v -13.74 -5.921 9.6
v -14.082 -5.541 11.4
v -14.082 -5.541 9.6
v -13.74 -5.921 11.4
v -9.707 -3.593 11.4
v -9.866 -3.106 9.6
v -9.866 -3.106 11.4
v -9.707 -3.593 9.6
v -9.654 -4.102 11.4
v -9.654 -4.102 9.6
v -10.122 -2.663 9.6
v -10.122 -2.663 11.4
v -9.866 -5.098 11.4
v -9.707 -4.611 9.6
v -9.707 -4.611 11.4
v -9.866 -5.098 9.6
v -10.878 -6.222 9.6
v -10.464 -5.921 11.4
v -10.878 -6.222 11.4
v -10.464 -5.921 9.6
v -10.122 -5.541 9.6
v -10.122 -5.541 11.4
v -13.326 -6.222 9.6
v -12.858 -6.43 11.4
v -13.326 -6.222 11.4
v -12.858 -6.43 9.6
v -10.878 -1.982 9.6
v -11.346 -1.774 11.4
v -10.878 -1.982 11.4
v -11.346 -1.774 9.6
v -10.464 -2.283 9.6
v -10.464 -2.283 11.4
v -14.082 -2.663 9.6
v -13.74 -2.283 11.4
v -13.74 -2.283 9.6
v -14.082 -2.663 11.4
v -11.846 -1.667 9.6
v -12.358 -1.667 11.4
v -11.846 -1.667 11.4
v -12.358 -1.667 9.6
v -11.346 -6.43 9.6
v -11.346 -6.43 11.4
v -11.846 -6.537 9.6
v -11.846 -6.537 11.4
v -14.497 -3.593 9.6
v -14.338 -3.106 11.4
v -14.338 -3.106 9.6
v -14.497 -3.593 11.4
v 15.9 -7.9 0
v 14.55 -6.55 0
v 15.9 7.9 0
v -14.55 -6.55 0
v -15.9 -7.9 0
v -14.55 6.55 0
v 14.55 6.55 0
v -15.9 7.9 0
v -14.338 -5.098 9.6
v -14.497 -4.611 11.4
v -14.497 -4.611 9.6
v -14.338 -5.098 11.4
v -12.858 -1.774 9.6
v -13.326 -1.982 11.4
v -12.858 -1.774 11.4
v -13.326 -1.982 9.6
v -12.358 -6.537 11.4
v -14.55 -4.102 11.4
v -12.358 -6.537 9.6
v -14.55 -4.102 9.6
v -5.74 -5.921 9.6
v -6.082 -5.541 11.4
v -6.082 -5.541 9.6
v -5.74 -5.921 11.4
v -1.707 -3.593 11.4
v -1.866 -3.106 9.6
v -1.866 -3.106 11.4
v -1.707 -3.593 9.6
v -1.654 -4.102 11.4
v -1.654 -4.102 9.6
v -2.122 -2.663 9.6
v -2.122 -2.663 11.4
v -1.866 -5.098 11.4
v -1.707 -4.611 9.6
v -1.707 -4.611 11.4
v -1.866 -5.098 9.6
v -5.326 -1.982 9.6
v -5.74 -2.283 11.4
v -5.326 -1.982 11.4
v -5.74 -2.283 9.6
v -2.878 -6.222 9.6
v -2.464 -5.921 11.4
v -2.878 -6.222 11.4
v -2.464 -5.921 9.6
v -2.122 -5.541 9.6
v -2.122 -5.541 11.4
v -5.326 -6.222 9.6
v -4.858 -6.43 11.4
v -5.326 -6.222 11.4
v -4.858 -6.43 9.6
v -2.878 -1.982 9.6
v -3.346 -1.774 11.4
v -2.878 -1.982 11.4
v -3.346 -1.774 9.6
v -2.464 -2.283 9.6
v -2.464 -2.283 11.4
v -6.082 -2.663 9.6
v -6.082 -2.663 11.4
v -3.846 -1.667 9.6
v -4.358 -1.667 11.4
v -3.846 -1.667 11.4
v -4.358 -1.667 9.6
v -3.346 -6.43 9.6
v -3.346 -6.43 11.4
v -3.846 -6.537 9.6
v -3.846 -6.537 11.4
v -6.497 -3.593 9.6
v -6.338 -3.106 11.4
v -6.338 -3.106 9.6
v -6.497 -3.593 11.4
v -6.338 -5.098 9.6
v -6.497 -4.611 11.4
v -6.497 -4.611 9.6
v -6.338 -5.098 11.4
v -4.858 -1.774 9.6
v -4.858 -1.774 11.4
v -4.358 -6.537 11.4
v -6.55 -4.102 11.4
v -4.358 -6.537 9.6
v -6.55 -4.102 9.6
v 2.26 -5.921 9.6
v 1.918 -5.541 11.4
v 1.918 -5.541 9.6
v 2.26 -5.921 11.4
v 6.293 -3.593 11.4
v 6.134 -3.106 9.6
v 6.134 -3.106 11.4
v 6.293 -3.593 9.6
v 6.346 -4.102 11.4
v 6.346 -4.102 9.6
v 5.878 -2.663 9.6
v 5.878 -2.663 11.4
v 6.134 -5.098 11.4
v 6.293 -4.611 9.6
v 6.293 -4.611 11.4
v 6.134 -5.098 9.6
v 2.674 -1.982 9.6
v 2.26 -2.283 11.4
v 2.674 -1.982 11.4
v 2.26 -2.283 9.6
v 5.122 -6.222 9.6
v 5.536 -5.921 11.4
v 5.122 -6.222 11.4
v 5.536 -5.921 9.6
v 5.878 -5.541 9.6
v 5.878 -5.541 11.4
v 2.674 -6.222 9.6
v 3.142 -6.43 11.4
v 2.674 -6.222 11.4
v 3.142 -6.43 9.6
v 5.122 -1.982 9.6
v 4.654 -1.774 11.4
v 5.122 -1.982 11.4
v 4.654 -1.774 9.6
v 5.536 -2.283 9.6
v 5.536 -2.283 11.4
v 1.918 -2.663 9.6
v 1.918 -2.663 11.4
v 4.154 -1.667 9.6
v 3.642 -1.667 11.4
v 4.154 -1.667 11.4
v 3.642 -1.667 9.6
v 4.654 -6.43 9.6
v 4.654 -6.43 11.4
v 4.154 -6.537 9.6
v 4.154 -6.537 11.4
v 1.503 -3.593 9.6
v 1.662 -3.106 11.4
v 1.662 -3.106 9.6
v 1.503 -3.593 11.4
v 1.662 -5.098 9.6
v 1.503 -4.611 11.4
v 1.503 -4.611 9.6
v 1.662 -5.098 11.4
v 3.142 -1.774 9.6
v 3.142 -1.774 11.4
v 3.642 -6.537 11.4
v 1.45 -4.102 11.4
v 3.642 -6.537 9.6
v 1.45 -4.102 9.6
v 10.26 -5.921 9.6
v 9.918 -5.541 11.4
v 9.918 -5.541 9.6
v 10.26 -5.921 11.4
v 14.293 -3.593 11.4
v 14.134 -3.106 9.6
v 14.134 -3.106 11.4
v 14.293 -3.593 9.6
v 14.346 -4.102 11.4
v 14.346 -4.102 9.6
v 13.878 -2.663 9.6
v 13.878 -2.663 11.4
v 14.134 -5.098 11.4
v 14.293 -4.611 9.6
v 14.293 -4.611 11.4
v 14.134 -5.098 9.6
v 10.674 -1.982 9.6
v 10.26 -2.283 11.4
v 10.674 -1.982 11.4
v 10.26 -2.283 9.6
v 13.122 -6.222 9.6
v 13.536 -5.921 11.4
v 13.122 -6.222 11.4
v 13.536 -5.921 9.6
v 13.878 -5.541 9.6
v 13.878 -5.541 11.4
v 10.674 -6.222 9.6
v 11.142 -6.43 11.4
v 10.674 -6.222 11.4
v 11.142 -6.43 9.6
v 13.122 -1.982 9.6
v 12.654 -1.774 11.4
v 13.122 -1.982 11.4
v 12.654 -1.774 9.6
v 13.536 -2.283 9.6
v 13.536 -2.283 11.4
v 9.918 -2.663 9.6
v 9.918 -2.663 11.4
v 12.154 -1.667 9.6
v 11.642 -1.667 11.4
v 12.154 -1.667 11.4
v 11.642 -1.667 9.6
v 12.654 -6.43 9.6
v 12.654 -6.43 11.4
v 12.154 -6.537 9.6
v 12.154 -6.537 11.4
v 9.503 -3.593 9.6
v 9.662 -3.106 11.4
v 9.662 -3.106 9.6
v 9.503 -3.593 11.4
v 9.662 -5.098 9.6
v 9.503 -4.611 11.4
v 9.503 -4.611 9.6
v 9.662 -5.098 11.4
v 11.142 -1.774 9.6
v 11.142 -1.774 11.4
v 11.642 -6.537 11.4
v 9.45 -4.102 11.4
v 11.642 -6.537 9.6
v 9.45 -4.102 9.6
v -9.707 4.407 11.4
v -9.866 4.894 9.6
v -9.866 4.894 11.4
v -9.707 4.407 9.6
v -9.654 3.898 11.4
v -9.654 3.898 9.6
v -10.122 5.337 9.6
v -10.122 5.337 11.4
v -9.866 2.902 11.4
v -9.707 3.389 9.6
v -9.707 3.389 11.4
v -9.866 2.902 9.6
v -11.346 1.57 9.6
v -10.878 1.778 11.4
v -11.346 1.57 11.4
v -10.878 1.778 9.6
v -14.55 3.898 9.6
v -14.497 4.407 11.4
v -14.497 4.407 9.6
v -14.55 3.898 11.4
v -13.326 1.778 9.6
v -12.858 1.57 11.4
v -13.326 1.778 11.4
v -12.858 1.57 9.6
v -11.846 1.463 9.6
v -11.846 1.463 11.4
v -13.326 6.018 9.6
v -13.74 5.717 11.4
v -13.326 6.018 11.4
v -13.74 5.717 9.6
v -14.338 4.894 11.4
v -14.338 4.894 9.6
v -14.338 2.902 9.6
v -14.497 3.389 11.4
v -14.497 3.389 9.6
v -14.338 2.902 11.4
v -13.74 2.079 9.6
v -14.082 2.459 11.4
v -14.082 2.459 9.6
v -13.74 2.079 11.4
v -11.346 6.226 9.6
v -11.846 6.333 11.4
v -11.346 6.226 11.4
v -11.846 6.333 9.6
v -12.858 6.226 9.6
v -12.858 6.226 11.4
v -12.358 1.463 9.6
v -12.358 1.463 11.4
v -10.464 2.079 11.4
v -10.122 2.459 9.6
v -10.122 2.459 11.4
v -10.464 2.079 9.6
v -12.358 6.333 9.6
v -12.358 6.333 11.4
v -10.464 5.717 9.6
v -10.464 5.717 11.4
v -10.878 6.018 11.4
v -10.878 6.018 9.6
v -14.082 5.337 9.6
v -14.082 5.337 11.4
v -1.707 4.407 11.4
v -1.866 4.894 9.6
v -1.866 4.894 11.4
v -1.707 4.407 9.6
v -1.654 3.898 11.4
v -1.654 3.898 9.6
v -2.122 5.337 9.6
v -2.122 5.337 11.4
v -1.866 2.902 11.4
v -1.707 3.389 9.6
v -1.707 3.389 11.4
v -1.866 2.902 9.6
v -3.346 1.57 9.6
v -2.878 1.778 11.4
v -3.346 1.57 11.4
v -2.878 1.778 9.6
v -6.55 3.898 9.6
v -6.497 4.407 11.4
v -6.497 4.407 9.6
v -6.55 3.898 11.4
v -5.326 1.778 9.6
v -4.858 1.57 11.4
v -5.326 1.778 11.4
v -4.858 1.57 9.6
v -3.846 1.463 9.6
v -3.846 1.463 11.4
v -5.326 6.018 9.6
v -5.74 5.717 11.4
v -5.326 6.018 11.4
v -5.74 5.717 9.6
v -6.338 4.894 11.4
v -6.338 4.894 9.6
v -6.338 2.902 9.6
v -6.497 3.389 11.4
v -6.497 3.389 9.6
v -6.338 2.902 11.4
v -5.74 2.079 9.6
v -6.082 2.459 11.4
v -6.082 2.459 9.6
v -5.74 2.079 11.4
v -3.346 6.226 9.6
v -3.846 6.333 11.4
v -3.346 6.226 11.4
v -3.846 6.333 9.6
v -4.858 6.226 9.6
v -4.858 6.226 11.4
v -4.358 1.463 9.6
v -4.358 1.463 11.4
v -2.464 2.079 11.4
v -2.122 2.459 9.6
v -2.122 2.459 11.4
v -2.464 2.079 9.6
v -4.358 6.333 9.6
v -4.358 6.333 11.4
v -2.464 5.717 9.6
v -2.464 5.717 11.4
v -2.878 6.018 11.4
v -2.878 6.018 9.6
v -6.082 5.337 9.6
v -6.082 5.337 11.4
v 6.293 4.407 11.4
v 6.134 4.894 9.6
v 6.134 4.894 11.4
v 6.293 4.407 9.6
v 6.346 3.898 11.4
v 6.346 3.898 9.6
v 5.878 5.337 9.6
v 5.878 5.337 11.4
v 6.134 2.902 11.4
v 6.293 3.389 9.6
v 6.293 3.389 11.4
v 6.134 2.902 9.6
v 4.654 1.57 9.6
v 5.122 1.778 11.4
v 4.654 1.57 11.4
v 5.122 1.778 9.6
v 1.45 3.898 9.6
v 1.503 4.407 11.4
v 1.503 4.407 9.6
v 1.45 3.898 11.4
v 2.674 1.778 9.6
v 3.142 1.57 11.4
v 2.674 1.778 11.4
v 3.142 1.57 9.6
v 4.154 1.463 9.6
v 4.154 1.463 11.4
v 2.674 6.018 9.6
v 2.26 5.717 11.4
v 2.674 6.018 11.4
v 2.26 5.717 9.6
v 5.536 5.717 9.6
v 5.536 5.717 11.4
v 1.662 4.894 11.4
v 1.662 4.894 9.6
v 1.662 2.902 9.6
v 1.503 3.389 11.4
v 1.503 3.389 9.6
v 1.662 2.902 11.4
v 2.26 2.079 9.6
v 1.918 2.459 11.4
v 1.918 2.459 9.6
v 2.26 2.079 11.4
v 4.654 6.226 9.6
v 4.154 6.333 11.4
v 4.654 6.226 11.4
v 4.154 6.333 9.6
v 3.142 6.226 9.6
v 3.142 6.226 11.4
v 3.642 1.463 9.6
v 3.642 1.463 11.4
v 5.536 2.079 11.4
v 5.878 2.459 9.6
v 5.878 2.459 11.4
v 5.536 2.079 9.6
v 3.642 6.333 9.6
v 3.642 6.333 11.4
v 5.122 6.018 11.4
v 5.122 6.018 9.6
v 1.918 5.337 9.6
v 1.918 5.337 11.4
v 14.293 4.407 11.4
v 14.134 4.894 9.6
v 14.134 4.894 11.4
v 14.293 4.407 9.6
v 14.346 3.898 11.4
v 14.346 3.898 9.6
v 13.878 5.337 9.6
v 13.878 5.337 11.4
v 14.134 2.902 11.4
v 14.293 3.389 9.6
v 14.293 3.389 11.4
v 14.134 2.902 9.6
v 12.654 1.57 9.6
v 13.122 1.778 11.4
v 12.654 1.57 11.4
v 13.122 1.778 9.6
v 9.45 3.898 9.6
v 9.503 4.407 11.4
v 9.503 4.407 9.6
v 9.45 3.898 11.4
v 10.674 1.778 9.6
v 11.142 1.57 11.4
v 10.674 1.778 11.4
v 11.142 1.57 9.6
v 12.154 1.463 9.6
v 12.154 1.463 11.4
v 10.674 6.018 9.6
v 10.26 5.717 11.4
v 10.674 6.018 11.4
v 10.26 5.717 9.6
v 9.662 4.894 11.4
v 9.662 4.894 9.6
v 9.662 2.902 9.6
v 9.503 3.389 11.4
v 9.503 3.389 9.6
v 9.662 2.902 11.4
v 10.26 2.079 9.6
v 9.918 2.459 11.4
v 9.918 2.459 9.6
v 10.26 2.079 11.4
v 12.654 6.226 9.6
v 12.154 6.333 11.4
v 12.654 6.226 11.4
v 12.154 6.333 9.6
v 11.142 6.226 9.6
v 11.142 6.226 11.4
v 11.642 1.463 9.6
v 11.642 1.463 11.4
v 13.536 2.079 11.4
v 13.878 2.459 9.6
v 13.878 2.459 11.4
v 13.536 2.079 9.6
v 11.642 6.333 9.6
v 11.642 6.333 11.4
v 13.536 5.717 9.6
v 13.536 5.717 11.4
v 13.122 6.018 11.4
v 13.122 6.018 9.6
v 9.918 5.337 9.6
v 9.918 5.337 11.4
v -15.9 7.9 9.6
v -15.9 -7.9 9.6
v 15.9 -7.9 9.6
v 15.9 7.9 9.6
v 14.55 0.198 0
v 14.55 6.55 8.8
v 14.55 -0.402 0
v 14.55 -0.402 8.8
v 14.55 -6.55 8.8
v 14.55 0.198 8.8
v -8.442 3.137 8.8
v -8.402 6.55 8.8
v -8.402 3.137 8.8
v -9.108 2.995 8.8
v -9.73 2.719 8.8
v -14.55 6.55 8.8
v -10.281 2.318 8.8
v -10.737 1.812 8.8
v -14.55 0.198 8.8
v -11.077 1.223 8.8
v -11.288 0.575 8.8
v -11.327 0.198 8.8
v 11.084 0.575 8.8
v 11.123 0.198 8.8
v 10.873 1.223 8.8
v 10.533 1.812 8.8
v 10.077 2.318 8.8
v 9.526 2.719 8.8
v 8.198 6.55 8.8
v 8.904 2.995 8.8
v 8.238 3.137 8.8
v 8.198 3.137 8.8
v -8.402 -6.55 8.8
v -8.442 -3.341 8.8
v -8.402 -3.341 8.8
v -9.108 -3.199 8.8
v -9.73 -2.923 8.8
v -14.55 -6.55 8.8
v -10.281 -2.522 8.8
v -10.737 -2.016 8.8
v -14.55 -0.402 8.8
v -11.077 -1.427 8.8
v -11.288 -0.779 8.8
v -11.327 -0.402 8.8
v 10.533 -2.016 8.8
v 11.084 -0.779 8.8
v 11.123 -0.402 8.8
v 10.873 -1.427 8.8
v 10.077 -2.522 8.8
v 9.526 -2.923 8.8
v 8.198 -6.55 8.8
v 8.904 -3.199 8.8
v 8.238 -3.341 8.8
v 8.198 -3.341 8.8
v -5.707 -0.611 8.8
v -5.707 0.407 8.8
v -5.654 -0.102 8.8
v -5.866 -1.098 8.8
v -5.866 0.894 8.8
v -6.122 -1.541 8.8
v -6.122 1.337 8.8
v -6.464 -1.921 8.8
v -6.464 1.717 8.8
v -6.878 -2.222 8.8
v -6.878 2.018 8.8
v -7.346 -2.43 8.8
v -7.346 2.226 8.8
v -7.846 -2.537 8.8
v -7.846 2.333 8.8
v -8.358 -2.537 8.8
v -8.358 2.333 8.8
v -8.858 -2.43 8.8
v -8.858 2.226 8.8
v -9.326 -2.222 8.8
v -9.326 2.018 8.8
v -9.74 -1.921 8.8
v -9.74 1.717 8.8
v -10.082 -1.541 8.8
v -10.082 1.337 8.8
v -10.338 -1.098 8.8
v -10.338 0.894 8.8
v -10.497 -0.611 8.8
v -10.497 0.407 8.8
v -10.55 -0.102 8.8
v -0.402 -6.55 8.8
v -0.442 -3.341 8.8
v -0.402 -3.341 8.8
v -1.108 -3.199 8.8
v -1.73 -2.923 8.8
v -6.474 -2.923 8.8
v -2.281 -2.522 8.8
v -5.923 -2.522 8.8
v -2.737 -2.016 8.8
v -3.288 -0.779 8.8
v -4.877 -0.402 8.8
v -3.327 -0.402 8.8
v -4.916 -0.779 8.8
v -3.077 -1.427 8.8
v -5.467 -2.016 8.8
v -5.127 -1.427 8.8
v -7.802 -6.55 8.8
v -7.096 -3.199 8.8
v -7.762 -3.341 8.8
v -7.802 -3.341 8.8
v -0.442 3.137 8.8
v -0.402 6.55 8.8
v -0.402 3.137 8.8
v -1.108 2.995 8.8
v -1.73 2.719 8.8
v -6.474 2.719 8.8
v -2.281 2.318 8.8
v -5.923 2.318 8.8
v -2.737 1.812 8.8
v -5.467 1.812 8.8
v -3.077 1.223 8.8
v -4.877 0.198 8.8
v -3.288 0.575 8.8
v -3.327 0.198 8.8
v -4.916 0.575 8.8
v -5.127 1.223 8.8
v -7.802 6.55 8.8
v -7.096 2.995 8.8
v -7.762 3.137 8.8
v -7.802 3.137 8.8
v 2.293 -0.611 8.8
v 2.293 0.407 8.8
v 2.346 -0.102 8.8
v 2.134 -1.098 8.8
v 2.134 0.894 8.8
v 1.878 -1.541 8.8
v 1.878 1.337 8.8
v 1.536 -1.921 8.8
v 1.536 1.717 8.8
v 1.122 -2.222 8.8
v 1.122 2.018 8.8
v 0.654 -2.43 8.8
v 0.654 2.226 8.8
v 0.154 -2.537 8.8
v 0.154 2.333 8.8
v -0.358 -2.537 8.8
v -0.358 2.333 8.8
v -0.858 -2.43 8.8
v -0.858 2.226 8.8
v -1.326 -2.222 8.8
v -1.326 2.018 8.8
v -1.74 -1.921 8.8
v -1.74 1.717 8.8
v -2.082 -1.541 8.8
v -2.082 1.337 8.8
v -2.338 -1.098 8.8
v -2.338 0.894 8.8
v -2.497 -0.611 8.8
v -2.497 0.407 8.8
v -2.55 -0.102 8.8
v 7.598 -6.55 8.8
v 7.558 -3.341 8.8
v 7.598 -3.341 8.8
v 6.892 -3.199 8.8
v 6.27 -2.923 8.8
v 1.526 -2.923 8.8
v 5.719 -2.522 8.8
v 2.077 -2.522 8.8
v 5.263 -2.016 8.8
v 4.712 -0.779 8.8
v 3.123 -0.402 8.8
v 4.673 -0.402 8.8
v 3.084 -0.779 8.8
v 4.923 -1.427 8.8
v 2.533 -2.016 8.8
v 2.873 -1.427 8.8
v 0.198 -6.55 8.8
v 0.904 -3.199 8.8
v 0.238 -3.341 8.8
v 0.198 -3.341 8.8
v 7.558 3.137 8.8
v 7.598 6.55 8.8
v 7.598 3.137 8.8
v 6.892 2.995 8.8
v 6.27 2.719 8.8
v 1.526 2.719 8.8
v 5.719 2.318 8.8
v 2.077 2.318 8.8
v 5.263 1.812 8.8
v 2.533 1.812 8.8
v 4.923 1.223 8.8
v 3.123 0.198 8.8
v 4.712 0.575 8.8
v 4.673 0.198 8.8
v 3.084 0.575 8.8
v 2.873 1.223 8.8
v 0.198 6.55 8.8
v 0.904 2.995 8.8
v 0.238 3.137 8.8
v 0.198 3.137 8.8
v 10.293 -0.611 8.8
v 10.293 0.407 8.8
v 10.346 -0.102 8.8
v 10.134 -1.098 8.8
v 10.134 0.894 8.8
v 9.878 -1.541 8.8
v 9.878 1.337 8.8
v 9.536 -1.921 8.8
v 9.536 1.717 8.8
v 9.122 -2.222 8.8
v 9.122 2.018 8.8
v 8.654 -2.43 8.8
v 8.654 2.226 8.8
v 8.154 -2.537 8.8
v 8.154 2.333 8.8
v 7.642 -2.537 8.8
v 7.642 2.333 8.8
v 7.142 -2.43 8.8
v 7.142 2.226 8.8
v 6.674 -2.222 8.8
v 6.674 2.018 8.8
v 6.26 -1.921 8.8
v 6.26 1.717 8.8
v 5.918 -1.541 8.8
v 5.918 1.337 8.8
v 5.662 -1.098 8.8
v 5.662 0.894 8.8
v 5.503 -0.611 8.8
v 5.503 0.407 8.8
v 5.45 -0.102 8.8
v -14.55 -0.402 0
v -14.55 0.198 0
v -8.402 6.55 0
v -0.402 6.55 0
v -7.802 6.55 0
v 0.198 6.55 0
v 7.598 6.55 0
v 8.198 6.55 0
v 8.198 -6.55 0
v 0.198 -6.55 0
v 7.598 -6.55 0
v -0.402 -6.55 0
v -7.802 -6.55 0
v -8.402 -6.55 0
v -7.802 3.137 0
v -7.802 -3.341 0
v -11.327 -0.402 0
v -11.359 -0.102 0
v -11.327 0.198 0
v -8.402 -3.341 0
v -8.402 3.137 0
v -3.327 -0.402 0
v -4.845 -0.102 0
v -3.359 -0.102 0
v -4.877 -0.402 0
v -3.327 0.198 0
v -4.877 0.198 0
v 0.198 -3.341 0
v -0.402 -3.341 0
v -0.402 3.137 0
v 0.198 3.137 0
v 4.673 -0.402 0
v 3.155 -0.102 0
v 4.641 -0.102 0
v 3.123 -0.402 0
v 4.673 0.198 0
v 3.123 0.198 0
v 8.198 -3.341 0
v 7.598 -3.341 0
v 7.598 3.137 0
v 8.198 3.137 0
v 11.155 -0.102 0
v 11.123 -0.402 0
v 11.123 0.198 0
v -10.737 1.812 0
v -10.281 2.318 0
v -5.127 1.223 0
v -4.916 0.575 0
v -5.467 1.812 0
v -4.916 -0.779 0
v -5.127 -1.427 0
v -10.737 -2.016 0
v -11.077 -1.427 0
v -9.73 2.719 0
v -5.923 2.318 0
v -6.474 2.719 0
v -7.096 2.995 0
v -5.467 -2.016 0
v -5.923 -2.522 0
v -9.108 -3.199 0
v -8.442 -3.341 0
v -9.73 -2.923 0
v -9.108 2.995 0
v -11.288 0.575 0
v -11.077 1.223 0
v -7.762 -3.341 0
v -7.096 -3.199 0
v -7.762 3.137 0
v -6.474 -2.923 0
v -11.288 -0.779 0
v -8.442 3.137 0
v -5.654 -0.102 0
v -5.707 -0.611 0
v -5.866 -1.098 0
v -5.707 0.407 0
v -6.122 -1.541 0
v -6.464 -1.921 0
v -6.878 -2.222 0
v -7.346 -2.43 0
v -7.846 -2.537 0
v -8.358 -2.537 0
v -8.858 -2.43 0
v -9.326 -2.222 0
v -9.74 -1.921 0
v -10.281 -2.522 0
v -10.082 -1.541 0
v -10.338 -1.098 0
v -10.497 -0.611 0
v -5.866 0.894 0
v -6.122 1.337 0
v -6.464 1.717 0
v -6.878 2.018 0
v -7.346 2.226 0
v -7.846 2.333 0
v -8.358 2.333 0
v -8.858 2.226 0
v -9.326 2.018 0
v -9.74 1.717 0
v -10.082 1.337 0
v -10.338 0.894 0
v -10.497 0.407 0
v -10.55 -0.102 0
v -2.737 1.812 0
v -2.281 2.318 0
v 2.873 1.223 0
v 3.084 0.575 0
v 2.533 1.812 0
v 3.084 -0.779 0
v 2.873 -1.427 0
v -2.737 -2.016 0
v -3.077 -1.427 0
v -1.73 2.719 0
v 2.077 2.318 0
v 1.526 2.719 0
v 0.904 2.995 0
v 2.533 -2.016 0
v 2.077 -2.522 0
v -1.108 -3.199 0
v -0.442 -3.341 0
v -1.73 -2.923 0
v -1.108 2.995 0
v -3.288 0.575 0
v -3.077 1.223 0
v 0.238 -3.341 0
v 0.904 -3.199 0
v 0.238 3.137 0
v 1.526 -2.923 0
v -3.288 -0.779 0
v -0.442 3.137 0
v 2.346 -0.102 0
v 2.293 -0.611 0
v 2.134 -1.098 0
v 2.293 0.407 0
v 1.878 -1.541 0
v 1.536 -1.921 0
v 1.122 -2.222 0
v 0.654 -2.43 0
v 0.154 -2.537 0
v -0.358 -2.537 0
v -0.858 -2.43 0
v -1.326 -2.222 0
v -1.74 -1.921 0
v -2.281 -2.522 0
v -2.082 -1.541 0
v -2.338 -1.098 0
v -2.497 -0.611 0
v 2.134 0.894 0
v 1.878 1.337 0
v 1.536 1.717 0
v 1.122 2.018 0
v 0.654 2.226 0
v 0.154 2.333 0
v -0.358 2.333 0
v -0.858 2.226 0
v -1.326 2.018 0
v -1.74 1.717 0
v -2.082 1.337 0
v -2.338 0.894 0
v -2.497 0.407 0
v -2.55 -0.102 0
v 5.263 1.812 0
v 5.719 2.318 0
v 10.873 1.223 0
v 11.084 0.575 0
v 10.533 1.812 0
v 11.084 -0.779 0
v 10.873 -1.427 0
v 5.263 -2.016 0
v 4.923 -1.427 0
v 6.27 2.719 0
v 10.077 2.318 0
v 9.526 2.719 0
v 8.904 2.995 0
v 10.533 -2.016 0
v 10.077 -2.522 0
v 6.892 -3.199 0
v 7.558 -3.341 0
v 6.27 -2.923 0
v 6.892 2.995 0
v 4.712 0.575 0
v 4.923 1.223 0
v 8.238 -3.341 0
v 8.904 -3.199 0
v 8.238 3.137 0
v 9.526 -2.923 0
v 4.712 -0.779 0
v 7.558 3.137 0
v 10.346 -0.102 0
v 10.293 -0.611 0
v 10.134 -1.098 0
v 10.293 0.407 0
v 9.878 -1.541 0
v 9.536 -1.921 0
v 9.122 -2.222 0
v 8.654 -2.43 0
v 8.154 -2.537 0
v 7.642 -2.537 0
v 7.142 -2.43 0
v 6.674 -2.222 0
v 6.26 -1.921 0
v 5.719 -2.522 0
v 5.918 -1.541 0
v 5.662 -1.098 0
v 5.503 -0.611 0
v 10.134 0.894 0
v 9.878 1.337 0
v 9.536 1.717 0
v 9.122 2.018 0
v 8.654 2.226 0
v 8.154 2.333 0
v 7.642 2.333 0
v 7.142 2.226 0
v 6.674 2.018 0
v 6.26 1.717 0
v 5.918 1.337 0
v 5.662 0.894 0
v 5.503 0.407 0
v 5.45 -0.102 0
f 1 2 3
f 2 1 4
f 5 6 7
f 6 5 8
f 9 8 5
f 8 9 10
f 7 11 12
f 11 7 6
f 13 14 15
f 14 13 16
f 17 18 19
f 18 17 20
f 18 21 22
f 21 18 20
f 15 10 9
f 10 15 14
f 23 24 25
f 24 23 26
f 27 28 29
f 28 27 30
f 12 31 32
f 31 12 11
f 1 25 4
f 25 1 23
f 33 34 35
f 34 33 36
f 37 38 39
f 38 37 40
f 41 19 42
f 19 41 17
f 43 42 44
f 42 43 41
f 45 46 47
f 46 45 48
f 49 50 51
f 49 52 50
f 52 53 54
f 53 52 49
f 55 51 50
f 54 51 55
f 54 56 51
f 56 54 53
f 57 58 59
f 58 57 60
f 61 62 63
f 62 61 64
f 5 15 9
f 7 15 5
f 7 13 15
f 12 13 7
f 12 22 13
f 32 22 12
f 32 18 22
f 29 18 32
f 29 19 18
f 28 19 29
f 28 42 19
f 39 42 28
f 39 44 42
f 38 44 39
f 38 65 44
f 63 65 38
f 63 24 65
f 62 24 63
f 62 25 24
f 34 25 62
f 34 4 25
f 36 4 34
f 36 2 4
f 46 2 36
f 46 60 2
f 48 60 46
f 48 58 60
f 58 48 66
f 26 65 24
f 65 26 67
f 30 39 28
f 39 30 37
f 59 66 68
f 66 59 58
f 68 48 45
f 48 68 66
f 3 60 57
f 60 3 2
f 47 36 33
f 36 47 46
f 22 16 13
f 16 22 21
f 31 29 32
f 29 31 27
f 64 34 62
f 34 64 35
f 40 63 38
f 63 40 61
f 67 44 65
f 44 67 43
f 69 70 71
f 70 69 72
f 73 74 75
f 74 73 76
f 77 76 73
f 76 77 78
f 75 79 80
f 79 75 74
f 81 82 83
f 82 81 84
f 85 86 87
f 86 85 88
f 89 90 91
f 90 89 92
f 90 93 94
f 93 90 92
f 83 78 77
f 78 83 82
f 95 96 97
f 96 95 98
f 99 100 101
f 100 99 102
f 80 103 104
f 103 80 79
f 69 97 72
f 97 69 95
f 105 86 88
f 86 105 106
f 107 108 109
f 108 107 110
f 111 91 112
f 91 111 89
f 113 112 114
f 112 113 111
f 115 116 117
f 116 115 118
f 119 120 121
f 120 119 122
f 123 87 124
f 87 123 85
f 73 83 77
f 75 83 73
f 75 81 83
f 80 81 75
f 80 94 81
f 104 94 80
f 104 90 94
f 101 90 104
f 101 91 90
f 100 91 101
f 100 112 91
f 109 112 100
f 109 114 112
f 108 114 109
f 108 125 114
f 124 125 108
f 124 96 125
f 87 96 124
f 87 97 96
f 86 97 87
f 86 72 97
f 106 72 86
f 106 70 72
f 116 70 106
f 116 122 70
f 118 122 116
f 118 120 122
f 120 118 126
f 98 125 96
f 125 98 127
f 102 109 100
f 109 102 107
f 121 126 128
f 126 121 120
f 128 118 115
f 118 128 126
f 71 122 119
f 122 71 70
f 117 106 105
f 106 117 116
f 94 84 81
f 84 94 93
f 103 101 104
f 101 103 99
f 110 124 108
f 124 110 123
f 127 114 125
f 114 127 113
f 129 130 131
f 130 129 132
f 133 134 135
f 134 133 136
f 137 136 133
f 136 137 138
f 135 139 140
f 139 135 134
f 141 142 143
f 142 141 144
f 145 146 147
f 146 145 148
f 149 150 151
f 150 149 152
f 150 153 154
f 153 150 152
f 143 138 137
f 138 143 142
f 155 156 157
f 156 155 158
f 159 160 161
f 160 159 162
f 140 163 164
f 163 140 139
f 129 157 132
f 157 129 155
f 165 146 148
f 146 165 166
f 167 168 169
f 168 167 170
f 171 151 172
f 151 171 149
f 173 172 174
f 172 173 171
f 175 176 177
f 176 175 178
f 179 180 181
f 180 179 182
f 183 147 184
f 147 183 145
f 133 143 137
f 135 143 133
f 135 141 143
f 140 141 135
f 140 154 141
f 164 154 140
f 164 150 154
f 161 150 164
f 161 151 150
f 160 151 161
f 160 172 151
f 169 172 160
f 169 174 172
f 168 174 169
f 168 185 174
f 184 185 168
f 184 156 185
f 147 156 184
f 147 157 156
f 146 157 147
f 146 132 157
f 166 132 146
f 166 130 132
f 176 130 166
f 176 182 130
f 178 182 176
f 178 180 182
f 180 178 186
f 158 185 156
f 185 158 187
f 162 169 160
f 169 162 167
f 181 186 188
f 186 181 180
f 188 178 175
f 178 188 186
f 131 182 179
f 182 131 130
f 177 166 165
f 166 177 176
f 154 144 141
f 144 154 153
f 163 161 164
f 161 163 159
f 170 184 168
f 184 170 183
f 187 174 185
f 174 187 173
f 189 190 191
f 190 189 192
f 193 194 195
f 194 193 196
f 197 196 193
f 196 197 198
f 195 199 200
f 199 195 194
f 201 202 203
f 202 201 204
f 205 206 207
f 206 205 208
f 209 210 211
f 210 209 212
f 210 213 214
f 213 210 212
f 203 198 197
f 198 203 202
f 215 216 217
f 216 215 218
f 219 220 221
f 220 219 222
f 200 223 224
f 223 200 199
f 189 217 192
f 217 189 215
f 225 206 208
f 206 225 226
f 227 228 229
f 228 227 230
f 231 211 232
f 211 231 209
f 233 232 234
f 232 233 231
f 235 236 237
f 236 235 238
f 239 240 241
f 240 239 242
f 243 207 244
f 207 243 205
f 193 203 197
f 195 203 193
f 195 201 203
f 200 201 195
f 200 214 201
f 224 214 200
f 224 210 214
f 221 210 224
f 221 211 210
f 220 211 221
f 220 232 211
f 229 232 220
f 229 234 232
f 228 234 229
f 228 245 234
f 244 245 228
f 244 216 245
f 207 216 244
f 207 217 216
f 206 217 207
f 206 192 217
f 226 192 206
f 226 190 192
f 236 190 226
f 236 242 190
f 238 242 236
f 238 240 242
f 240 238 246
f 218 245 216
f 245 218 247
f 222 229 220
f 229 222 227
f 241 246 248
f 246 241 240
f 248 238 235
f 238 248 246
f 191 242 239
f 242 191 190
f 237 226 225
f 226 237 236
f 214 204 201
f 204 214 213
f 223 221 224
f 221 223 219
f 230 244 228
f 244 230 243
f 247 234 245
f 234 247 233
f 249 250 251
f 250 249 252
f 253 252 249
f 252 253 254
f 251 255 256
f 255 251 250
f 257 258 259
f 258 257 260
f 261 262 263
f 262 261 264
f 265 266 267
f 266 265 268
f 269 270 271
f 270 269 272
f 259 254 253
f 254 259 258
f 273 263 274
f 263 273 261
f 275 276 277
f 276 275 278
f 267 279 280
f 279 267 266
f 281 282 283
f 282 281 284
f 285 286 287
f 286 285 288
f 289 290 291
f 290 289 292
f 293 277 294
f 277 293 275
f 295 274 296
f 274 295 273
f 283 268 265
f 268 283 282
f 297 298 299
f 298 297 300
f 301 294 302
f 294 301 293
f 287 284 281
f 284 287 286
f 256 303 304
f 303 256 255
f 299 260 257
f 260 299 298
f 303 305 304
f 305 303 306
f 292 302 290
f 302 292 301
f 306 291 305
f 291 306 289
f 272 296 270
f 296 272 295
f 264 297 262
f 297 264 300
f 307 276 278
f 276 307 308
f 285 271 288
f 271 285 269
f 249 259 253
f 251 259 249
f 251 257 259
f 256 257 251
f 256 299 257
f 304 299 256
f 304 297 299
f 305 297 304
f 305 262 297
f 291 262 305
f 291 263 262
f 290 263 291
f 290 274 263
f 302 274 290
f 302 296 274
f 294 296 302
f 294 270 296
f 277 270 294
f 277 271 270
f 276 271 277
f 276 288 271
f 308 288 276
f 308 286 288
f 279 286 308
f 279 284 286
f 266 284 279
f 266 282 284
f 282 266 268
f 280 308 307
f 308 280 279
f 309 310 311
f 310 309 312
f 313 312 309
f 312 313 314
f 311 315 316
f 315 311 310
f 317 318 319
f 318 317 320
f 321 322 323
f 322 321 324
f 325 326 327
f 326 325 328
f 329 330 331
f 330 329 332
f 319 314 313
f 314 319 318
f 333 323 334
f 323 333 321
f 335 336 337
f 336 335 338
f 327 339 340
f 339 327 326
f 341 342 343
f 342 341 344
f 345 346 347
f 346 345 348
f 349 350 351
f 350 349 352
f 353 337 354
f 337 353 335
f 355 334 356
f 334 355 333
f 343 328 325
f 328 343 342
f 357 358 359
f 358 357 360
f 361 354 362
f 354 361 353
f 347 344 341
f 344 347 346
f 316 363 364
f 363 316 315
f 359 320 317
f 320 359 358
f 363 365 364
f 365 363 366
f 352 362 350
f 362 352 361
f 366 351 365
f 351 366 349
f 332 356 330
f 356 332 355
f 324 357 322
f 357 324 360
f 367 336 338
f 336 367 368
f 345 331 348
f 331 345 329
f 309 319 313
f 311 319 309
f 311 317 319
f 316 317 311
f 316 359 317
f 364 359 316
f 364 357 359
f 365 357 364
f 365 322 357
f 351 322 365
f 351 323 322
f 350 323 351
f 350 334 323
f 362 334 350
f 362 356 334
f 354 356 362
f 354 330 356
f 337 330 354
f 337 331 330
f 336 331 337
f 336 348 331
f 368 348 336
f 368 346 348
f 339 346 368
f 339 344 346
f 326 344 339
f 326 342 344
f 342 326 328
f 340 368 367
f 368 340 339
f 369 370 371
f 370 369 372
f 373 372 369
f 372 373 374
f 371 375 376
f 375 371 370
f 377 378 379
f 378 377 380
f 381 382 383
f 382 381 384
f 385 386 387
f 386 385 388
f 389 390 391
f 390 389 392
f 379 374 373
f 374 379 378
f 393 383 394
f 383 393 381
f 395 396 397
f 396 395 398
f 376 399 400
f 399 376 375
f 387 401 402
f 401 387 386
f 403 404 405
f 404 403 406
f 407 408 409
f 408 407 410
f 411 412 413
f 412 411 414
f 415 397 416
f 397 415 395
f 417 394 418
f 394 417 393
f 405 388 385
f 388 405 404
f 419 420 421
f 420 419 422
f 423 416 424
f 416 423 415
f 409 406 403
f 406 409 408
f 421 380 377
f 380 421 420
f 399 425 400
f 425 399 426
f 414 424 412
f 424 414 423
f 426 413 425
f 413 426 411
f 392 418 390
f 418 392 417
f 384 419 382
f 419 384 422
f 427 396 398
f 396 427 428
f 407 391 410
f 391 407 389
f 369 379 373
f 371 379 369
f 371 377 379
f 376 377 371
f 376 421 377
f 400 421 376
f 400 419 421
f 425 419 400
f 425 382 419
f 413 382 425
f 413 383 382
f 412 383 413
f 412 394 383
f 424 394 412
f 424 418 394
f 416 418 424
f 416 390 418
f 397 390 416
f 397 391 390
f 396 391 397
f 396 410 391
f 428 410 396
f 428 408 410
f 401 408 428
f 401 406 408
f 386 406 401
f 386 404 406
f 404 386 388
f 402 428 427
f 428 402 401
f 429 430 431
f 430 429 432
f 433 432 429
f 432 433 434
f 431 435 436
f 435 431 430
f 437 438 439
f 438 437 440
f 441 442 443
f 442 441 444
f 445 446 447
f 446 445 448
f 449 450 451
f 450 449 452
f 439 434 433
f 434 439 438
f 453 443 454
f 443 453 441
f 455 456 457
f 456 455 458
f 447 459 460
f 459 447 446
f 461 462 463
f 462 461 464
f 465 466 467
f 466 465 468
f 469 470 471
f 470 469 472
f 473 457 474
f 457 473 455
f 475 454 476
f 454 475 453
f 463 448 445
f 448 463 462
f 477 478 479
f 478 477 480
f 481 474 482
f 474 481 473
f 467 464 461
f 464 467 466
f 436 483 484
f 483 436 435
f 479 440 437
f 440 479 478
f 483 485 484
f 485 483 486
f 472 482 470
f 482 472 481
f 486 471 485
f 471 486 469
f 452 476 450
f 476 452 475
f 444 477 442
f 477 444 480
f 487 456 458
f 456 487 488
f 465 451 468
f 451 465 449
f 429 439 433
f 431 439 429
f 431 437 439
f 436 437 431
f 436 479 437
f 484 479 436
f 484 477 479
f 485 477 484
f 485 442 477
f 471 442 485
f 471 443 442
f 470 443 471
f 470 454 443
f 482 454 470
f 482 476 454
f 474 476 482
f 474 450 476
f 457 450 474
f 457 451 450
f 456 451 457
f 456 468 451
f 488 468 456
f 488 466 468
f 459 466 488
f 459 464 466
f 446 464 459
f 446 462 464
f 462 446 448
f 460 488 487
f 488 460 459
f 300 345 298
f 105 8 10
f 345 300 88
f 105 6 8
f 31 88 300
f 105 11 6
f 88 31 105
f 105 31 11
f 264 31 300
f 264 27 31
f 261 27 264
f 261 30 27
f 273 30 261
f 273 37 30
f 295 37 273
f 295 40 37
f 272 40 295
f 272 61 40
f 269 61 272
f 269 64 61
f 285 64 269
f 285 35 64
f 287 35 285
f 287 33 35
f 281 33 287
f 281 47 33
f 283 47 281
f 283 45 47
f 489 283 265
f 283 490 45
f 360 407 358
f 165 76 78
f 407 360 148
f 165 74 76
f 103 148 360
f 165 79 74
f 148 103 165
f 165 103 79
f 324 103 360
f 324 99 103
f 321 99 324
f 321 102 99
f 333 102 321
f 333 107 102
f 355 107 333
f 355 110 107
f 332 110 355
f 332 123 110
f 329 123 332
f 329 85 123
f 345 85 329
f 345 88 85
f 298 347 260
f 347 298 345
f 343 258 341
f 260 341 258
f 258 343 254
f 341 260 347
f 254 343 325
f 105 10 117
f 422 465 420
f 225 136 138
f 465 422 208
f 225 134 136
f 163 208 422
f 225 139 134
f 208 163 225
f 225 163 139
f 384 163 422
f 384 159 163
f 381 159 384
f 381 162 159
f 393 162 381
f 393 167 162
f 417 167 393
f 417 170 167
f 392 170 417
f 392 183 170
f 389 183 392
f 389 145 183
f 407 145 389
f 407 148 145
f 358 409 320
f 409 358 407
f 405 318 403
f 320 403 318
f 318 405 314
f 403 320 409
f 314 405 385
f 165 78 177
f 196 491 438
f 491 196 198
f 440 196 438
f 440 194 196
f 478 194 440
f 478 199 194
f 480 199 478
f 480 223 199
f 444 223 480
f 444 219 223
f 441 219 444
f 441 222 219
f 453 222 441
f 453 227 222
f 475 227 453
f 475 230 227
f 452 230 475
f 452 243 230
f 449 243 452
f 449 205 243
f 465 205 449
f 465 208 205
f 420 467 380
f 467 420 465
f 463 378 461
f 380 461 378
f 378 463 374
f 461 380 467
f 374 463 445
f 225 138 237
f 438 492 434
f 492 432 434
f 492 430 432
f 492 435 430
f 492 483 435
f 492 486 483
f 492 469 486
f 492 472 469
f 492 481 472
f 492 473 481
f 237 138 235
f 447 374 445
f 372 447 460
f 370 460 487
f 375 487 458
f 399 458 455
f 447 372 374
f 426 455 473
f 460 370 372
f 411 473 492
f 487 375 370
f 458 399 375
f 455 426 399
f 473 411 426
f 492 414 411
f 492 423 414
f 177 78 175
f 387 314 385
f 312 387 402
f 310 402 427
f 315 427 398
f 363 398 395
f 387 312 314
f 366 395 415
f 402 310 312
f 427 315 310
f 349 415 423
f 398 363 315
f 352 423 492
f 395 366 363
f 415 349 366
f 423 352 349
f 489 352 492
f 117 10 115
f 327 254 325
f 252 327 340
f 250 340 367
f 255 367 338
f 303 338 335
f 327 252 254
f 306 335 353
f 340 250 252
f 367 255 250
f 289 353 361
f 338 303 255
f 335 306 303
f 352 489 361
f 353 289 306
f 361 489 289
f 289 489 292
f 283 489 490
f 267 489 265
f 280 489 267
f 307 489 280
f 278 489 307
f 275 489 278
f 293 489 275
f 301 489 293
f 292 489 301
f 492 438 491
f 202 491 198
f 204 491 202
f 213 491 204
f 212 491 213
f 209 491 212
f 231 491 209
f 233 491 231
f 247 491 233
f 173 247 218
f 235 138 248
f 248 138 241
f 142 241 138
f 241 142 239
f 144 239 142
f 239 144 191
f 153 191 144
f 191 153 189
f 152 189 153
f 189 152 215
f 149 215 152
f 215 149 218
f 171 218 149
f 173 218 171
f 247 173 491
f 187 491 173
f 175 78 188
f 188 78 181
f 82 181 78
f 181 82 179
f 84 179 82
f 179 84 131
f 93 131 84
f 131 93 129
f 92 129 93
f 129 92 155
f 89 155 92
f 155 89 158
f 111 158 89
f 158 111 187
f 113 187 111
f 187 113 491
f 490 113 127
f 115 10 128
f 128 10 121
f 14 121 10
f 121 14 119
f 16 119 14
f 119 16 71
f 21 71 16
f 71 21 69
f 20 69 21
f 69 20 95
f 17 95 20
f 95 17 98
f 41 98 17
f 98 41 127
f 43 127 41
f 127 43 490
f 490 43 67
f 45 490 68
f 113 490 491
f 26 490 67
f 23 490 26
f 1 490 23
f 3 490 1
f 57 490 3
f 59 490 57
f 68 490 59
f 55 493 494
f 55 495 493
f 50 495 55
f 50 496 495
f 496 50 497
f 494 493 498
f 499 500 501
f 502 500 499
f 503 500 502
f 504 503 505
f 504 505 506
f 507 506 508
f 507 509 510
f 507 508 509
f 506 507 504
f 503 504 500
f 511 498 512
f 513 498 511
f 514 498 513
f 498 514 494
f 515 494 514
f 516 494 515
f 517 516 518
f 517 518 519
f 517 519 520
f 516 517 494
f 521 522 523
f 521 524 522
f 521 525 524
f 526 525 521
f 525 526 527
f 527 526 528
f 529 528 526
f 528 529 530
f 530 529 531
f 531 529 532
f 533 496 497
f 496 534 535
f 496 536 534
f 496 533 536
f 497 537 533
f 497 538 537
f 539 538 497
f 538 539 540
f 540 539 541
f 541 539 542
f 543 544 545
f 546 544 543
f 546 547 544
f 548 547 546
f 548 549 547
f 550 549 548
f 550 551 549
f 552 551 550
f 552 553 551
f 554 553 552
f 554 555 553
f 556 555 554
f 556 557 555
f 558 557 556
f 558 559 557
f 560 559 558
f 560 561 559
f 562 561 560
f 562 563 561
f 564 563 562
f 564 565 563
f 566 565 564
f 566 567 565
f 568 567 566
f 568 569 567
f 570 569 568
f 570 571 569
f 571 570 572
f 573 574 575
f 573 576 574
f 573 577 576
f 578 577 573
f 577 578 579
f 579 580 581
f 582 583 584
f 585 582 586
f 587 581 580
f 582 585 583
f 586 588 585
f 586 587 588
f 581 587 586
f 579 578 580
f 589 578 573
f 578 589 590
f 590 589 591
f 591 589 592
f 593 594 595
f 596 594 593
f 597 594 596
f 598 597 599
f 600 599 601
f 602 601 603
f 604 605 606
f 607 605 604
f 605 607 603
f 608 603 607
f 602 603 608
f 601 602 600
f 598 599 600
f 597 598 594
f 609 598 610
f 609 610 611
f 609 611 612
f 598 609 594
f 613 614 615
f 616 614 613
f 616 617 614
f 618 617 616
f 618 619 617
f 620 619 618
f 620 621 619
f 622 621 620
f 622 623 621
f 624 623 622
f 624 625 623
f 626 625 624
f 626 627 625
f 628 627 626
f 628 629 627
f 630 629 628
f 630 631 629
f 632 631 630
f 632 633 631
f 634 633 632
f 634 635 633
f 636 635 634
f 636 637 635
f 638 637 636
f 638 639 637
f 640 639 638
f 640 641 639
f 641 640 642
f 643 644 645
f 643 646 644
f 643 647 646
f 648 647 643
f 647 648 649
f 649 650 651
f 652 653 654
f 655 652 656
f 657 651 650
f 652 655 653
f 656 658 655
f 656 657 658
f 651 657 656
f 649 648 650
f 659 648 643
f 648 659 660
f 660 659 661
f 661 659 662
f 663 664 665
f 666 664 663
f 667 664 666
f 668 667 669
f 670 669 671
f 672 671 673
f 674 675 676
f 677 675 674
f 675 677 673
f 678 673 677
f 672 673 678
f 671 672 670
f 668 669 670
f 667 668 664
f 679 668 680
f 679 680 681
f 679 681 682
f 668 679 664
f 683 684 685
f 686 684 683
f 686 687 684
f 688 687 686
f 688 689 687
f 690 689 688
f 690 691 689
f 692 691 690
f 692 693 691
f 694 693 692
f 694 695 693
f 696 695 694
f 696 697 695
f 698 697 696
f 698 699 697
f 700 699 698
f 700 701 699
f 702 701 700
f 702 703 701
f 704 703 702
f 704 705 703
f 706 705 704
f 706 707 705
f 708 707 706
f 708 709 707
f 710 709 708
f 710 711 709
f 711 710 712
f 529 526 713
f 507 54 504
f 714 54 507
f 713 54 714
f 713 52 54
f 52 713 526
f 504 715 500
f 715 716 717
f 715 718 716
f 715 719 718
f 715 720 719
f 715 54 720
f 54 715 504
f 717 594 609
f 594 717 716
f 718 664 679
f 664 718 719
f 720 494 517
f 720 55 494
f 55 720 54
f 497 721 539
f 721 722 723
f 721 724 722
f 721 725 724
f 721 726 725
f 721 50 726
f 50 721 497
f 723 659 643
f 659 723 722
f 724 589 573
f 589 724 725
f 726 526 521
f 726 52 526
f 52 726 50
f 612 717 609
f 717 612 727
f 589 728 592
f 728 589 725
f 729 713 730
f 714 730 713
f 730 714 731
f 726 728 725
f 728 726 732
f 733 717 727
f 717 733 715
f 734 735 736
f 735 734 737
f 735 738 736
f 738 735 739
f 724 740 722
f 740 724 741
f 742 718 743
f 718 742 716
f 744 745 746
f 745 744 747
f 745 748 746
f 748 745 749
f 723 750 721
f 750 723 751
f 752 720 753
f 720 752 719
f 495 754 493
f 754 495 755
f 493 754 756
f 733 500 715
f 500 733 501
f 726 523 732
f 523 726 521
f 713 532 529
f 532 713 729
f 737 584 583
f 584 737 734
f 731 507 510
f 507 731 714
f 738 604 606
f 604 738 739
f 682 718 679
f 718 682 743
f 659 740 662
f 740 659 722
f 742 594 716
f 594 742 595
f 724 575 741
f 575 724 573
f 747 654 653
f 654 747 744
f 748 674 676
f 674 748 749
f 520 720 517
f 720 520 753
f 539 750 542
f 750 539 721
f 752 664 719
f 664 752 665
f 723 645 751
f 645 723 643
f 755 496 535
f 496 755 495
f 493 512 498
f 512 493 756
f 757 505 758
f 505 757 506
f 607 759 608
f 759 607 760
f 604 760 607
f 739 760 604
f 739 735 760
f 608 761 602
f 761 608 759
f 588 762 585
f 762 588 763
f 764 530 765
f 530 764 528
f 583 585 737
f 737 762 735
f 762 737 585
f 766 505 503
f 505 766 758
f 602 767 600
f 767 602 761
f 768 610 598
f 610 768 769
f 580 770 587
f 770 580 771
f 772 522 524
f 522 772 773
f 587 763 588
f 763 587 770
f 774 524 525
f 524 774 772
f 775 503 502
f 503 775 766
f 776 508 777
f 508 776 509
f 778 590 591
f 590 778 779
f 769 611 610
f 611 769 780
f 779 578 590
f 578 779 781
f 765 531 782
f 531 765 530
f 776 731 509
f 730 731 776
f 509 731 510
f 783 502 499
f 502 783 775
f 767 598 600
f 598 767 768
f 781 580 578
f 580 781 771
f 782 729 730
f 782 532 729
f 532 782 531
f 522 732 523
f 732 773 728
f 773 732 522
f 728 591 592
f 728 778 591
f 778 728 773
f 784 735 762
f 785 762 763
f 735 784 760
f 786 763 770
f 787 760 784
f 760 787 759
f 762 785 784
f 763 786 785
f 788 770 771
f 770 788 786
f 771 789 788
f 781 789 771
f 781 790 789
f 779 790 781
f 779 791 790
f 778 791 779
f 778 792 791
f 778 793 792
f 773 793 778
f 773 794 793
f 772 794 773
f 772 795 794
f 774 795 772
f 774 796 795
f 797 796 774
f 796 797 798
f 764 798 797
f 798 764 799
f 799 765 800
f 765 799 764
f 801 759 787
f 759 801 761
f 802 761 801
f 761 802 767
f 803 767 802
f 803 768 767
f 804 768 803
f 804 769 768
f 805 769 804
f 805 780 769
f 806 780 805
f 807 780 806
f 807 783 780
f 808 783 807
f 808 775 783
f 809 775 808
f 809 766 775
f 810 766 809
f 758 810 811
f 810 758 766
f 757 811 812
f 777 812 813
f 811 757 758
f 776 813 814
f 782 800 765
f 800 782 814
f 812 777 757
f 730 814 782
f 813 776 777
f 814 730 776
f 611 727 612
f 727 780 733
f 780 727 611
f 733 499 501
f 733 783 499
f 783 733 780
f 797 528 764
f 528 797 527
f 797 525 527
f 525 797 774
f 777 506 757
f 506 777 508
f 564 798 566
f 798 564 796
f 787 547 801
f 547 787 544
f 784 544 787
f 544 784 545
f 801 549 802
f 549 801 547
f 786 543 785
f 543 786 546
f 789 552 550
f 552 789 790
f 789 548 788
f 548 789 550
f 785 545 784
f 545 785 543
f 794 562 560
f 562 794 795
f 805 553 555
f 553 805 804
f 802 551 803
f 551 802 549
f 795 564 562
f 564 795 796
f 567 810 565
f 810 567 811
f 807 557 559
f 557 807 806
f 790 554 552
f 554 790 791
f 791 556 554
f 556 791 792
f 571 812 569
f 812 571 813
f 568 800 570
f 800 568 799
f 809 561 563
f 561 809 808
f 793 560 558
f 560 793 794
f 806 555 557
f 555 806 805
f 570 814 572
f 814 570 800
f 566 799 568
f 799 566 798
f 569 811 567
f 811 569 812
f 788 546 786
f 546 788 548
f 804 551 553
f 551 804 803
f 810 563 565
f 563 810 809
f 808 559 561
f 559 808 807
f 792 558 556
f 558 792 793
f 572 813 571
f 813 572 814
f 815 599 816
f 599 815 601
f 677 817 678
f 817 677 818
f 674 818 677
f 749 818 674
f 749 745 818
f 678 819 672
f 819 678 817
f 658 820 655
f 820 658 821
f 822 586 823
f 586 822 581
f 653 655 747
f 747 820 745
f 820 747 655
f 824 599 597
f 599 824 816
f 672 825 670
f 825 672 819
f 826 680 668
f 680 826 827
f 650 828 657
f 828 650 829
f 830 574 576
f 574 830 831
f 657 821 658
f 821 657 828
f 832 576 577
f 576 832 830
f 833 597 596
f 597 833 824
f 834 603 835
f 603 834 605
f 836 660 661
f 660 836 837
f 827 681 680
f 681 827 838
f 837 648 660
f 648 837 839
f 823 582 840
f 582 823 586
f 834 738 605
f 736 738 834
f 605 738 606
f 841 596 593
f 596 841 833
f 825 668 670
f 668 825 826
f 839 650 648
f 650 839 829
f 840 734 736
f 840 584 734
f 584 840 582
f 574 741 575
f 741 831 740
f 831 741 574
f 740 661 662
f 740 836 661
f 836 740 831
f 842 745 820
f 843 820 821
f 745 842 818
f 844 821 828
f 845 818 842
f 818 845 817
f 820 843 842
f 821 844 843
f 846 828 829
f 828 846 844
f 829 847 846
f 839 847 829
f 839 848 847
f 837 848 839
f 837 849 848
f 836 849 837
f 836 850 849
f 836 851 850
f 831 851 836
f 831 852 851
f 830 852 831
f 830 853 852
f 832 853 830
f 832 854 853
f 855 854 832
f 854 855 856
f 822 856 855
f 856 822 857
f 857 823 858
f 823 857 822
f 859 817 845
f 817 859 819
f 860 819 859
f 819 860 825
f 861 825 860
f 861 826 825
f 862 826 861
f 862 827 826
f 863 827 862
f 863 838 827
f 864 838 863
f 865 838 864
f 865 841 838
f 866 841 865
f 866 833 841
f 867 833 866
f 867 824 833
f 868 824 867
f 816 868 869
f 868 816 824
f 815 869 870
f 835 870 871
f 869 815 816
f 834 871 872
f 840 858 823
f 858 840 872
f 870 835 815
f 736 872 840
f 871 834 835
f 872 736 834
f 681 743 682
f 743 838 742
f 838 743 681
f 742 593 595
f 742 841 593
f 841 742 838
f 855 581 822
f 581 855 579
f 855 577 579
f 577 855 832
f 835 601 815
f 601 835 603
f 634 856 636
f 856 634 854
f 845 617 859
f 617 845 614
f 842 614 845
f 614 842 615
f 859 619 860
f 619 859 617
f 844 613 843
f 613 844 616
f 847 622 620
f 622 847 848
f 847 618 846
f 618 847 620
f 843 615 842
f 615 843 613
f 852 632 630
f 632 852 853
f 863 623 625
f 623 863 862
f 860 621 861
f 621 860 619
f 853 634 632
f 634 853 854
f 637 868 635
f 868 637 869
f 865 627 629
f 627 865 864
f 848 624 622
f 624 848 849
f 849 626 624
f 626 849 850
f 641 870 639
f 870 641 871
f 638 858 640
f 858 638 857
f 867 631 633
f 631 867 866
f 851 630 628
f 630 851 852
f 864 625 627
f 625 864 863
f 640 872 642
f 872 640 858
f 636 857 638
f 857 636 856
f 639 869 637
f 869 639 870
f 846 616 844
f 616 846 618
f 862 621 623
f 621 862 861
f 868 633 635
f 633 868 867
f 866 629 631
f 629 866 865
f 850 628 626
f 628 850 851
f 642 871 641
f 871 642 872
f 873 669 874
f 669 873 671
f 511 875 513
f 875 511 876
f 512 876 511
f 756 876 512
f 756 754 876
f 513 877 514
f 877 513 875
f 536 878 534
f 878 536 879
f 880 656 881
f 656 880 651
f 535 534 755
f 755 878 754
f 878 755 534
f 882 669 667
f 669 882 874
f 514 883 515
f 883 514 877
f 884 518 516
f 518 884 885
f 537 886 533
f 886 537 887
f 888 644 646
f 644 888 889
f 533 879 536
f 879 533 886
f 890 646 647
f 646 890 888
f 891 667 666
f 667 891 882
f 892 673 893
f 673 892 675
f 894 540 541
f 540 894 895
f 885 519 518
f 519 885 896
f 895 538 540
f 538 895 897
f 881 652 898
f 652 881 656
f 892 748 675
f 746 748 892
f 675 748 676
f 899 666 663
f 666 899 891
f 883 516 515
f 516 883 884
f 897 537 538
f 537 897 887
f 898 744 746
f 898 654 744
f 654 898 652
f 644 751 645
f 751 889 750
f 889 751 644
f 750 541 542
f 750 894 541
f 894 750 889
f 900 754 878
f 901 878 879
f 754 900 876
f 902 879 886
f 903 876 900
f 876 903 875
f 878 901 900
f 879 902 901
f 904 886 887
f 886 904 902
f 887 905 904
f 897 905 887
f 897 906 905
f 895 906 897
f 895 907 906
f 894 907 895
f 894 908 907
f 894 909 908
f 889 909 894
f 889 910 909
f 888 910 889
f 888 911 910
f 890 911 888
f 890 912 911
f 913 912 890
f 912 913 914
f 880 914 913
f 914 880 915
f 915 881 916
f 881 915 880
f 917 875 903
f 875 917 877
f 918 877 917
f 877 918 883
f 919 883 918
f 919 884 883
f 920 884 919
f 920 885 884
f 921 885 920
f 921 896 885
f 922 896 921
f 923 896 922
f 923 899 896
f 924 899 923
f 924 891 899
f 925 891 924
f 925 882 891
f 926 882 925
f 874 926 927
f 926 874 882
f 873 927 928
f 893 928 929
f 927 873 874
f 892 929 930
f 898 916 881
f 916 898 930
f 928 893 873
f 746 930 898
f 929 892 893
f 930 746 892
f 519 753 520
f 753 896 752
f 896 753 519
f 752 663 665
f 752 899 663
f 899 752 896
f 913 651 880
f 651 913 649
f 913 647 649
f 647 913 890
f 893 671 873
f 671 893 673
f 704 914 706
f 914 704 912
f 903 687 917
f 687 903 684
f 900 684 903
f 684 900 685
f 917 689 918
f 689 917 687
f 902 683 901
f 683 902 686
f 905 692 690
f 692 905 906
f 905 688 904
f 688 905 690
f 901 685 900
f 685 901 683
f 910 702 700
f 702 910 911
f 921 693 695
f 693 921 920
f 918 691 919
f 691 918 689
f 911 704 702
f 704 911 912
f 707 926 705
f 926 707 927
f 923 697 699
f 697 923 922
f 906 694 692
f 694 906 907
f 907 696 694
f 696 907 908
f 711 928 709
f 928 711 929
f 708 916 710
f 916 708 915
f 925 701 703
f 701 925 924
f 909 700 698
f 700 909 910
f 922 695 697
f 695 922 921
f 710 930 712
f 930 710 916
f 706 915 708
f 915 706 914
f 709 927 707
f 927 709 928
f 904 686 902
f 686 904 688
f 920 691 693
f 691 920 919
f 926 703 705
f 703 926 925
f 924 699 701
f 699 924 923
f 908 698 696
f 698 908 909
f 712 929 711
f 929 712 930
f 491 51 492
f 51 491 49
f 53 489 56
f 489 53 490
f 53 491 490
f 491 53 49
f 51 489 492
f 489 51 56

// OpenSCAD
// * LEGO®, the LEGO® logo, the Brick, DUPLO®, and MINDSTORMS® are trademarks of the LEGO® Group. ©2012 The LEGO® Group.
 //

/* [General] */

// Width of the block, in studs
block_width = 2;

// Length of the block, in studs
block_length = 4;

//Do you want the flexible grooves?
Grooves =false; //true or false

// Height of the block. A ratio of "1" is a standard LEGO brick height; a ratio of "1/3" is a standard LEGO plate height; "1/2" is a standard DUPLO plate.
//RECOMENDED: Use 0.1 for lego stud tape and .34 for tile tape. This is left as user editible in case your filament is more/less flexible than mine. 
//Tring .25mm for 7x7 hard top for cuitcuit cover, .3 thick for chassis
    block_height_ratio = 1; // [.33333333333:1/3, .5:1/2, 1:1, 2:2, 3:3, 4:4, 5:5, 6:6, 7:7, 8:8, 9:9, 10:10]

/* Hidden */
knobScale=1.0;
postScale=1.0;


knob_diameter=4.896*knobScale;		//knobs on top of blocks.
knob_height=1.8;
knob_spacing=8.0;
wall_thickness=1.45;
roof_thickness=.800;
block_height=9.6*block_height_ratio;
pin_diameter=3.2*postScale;		//pin for bottom blocks with width or length of 1.
post_diameter=6.5137*postScale; //The Post on the bottom of blocks. 
reinforcing_width=.6;
axle_spline_width=2.0;
axle_diameter=5;
cylinder_precision=0.03;
overall_length=block_length*8;
overall_width=block_width*8;
    
difference(){
    block(block_width ,block_length,1,axle_hole=false,reinforcement=true);
    if (Grooves == true) {
    grooves();
    }
    //These translated cubes cut out .1mm form the ends of each side of the brick for clearance to the next brick.
    translate([block_length*knob_spacing/2,0,0]){
        cube([.2,8*block_width+.01,block_height*2.01], center = true);
    }
     translate([-block_length*knob_spacing/2,0,0]){
        cube([.2,8*block_width+.01,block_height*2.01], center = true);
    }
     translate([0,-block_width*knob_spacing/2,0]){
        cube([8*block_length+.01,.2,block_height*2.01], center = true);
    }
     translate([0,block_width*knob_spacing/2,0]){
        cube([8*block_length+.01,.2,block_height*2.01], center = true);
    }
    
}
                

module grooves(height){
        	translate([-overall_length/2,-overall_width/2-.01,0]) {              
        for (ycount=[1:block_width-1]){
							for (xcount=[1:block_length-1]) {	
                                translate([xcount*knob_spacing,block_width*knob_spacing/2,block_height-1.5/4+.01]){
                                cube([.75,block_width*knob_spacing,1.5/2], center = true); 
                                    //y axisgrooves
                                } 
                                translate([block_length*knob_spacing/2,ycount*knob_spacing,block_height-1.5/4+.01]){
                                cube([block_length*knob_spacing,.75,1.5/2], center = true);
                                    //x axis grooves
                                   
                                }
                                
                            }
                        }
                    }
                }
                
                
module block(width,length,height,axle_hole,reinforcement) {
    overall_length=block_length*8;
    //overall_length=(length-1)*knob_spacing+knob_diameter/1+wall_thickness*2; 
    overall_width=block_width*8;
	//overall_width=(width-1)*knob_spacing+knob_diameter/1+wall_thickness*2;
	start=(knob_diameter/2+knob_spacing/2+wall_thickness);
	translate([-overall_length/2,-overall_width/2,0])
		union() {
			difference() {
				union() {
					cube([overall_length,overall_width,height*block_height]);
					translate([knob_diameter/2+wall_thickness,knob_diameter/2+wall_thickness,0]) 
						for (ycount=[0:width-1])
							for (xcount=[0:length-1]) {	
                                translate([xcount*knob_spacing,ycount*knob_spacing,0])
                                cylinder(r=knob_diameter/2,h=block_height*height+knob_height,$fs=cylinder_precision);
                                }
                         }
				
                    translate([wall_thickness,wall_thickness,-roof_thickness]) cube([overall_length-wall_thickness*2,overall_width-wall_thickness*2,block_height*height]);
                }
	
			if (reinforcement==true && width>1 && length>1)
				difference() {
					for (ycount=[1:width-1])
						for (xcount=[1:length-1])
							translate([(xcount-1)*knob_spacing+start,(ycount-1)*knob_spacing+start,0]) reinforcement(height);
					for (ycount=[1:width-1])
						for (xcount=[1:length-1])
							translate([(xcount-1)*knob_spacing+start,(ycount-1)*knob_spacing+start,-0.5]) cylinder(r=post_diameter/2-0.1, h=height*block_height+0.5, $fs=cylinder_precision);
				}
	
			if (width>1 && length>1) for (ycount=[1:width-1])
				for (xcount=[1:length-1])
					translate([(xcount-1)*knob_spacing+start,(ycount-1)*knob_spacing+start,0]) post(height,axle_hole);
	
			if (width==1 && length!=1)
				for (xcount=[1:length-1])
					translate([(xcount-1)*knob_spacing+start,overall_width/2,0]) cylinder(r=pin_diameter/2,h=block_height*height,$fs=cylinder_precision);   
         
            if (width==1 && length!=1)
				for (xcount=[1:length-1])
					translate([(xcount-1)*knob_spacing+start,overall_width/2,block_height/2]) cube([reinforcing_width,7,height*block_height],center=true);     
  
         
			if (length==1 && width!=1)
				for (ycount=[1:width-1])
					translate([overall_length/2,(ycount-1)*knob_spacing+start,0]) cylinder(r=pin_diameter/2,h=block_height*height,$fs=cylinder_precision);
            if (length==1 && width!=1)
				for (ycount=[1:width-1])
                    translate([overall_length/2,(ycount-1)*knob_spacing+start,block_height/2]) cube([7,reinforcing_width,height*block_height],center=true);  

            }
}

module post(height,axle_hole=false) {
	difference() {
		cylinder(r=post_diameter/2, h=height*block_height,$fs=cylinder_precision);
		translate([0,0,-0.5])
            cylinder(r=knob_diameter/2, h=height*block_height+1,$fs=cylinder_precision);

	}
}

module reinforcement(height) {
	union() {
		translate([0,0,height*block_height/2]) union() {
			cube([reinforcing_width,knob_spacing+knob_diameter+wall_thickness/2,height*block_height],center=true);
			rotate(v=[0,0,1],a=90) cube([reinforcing_width,knob_spacing+knob_diameter+wall_thickness/2,height*block_height], center=true);
		}
	}
}
		
